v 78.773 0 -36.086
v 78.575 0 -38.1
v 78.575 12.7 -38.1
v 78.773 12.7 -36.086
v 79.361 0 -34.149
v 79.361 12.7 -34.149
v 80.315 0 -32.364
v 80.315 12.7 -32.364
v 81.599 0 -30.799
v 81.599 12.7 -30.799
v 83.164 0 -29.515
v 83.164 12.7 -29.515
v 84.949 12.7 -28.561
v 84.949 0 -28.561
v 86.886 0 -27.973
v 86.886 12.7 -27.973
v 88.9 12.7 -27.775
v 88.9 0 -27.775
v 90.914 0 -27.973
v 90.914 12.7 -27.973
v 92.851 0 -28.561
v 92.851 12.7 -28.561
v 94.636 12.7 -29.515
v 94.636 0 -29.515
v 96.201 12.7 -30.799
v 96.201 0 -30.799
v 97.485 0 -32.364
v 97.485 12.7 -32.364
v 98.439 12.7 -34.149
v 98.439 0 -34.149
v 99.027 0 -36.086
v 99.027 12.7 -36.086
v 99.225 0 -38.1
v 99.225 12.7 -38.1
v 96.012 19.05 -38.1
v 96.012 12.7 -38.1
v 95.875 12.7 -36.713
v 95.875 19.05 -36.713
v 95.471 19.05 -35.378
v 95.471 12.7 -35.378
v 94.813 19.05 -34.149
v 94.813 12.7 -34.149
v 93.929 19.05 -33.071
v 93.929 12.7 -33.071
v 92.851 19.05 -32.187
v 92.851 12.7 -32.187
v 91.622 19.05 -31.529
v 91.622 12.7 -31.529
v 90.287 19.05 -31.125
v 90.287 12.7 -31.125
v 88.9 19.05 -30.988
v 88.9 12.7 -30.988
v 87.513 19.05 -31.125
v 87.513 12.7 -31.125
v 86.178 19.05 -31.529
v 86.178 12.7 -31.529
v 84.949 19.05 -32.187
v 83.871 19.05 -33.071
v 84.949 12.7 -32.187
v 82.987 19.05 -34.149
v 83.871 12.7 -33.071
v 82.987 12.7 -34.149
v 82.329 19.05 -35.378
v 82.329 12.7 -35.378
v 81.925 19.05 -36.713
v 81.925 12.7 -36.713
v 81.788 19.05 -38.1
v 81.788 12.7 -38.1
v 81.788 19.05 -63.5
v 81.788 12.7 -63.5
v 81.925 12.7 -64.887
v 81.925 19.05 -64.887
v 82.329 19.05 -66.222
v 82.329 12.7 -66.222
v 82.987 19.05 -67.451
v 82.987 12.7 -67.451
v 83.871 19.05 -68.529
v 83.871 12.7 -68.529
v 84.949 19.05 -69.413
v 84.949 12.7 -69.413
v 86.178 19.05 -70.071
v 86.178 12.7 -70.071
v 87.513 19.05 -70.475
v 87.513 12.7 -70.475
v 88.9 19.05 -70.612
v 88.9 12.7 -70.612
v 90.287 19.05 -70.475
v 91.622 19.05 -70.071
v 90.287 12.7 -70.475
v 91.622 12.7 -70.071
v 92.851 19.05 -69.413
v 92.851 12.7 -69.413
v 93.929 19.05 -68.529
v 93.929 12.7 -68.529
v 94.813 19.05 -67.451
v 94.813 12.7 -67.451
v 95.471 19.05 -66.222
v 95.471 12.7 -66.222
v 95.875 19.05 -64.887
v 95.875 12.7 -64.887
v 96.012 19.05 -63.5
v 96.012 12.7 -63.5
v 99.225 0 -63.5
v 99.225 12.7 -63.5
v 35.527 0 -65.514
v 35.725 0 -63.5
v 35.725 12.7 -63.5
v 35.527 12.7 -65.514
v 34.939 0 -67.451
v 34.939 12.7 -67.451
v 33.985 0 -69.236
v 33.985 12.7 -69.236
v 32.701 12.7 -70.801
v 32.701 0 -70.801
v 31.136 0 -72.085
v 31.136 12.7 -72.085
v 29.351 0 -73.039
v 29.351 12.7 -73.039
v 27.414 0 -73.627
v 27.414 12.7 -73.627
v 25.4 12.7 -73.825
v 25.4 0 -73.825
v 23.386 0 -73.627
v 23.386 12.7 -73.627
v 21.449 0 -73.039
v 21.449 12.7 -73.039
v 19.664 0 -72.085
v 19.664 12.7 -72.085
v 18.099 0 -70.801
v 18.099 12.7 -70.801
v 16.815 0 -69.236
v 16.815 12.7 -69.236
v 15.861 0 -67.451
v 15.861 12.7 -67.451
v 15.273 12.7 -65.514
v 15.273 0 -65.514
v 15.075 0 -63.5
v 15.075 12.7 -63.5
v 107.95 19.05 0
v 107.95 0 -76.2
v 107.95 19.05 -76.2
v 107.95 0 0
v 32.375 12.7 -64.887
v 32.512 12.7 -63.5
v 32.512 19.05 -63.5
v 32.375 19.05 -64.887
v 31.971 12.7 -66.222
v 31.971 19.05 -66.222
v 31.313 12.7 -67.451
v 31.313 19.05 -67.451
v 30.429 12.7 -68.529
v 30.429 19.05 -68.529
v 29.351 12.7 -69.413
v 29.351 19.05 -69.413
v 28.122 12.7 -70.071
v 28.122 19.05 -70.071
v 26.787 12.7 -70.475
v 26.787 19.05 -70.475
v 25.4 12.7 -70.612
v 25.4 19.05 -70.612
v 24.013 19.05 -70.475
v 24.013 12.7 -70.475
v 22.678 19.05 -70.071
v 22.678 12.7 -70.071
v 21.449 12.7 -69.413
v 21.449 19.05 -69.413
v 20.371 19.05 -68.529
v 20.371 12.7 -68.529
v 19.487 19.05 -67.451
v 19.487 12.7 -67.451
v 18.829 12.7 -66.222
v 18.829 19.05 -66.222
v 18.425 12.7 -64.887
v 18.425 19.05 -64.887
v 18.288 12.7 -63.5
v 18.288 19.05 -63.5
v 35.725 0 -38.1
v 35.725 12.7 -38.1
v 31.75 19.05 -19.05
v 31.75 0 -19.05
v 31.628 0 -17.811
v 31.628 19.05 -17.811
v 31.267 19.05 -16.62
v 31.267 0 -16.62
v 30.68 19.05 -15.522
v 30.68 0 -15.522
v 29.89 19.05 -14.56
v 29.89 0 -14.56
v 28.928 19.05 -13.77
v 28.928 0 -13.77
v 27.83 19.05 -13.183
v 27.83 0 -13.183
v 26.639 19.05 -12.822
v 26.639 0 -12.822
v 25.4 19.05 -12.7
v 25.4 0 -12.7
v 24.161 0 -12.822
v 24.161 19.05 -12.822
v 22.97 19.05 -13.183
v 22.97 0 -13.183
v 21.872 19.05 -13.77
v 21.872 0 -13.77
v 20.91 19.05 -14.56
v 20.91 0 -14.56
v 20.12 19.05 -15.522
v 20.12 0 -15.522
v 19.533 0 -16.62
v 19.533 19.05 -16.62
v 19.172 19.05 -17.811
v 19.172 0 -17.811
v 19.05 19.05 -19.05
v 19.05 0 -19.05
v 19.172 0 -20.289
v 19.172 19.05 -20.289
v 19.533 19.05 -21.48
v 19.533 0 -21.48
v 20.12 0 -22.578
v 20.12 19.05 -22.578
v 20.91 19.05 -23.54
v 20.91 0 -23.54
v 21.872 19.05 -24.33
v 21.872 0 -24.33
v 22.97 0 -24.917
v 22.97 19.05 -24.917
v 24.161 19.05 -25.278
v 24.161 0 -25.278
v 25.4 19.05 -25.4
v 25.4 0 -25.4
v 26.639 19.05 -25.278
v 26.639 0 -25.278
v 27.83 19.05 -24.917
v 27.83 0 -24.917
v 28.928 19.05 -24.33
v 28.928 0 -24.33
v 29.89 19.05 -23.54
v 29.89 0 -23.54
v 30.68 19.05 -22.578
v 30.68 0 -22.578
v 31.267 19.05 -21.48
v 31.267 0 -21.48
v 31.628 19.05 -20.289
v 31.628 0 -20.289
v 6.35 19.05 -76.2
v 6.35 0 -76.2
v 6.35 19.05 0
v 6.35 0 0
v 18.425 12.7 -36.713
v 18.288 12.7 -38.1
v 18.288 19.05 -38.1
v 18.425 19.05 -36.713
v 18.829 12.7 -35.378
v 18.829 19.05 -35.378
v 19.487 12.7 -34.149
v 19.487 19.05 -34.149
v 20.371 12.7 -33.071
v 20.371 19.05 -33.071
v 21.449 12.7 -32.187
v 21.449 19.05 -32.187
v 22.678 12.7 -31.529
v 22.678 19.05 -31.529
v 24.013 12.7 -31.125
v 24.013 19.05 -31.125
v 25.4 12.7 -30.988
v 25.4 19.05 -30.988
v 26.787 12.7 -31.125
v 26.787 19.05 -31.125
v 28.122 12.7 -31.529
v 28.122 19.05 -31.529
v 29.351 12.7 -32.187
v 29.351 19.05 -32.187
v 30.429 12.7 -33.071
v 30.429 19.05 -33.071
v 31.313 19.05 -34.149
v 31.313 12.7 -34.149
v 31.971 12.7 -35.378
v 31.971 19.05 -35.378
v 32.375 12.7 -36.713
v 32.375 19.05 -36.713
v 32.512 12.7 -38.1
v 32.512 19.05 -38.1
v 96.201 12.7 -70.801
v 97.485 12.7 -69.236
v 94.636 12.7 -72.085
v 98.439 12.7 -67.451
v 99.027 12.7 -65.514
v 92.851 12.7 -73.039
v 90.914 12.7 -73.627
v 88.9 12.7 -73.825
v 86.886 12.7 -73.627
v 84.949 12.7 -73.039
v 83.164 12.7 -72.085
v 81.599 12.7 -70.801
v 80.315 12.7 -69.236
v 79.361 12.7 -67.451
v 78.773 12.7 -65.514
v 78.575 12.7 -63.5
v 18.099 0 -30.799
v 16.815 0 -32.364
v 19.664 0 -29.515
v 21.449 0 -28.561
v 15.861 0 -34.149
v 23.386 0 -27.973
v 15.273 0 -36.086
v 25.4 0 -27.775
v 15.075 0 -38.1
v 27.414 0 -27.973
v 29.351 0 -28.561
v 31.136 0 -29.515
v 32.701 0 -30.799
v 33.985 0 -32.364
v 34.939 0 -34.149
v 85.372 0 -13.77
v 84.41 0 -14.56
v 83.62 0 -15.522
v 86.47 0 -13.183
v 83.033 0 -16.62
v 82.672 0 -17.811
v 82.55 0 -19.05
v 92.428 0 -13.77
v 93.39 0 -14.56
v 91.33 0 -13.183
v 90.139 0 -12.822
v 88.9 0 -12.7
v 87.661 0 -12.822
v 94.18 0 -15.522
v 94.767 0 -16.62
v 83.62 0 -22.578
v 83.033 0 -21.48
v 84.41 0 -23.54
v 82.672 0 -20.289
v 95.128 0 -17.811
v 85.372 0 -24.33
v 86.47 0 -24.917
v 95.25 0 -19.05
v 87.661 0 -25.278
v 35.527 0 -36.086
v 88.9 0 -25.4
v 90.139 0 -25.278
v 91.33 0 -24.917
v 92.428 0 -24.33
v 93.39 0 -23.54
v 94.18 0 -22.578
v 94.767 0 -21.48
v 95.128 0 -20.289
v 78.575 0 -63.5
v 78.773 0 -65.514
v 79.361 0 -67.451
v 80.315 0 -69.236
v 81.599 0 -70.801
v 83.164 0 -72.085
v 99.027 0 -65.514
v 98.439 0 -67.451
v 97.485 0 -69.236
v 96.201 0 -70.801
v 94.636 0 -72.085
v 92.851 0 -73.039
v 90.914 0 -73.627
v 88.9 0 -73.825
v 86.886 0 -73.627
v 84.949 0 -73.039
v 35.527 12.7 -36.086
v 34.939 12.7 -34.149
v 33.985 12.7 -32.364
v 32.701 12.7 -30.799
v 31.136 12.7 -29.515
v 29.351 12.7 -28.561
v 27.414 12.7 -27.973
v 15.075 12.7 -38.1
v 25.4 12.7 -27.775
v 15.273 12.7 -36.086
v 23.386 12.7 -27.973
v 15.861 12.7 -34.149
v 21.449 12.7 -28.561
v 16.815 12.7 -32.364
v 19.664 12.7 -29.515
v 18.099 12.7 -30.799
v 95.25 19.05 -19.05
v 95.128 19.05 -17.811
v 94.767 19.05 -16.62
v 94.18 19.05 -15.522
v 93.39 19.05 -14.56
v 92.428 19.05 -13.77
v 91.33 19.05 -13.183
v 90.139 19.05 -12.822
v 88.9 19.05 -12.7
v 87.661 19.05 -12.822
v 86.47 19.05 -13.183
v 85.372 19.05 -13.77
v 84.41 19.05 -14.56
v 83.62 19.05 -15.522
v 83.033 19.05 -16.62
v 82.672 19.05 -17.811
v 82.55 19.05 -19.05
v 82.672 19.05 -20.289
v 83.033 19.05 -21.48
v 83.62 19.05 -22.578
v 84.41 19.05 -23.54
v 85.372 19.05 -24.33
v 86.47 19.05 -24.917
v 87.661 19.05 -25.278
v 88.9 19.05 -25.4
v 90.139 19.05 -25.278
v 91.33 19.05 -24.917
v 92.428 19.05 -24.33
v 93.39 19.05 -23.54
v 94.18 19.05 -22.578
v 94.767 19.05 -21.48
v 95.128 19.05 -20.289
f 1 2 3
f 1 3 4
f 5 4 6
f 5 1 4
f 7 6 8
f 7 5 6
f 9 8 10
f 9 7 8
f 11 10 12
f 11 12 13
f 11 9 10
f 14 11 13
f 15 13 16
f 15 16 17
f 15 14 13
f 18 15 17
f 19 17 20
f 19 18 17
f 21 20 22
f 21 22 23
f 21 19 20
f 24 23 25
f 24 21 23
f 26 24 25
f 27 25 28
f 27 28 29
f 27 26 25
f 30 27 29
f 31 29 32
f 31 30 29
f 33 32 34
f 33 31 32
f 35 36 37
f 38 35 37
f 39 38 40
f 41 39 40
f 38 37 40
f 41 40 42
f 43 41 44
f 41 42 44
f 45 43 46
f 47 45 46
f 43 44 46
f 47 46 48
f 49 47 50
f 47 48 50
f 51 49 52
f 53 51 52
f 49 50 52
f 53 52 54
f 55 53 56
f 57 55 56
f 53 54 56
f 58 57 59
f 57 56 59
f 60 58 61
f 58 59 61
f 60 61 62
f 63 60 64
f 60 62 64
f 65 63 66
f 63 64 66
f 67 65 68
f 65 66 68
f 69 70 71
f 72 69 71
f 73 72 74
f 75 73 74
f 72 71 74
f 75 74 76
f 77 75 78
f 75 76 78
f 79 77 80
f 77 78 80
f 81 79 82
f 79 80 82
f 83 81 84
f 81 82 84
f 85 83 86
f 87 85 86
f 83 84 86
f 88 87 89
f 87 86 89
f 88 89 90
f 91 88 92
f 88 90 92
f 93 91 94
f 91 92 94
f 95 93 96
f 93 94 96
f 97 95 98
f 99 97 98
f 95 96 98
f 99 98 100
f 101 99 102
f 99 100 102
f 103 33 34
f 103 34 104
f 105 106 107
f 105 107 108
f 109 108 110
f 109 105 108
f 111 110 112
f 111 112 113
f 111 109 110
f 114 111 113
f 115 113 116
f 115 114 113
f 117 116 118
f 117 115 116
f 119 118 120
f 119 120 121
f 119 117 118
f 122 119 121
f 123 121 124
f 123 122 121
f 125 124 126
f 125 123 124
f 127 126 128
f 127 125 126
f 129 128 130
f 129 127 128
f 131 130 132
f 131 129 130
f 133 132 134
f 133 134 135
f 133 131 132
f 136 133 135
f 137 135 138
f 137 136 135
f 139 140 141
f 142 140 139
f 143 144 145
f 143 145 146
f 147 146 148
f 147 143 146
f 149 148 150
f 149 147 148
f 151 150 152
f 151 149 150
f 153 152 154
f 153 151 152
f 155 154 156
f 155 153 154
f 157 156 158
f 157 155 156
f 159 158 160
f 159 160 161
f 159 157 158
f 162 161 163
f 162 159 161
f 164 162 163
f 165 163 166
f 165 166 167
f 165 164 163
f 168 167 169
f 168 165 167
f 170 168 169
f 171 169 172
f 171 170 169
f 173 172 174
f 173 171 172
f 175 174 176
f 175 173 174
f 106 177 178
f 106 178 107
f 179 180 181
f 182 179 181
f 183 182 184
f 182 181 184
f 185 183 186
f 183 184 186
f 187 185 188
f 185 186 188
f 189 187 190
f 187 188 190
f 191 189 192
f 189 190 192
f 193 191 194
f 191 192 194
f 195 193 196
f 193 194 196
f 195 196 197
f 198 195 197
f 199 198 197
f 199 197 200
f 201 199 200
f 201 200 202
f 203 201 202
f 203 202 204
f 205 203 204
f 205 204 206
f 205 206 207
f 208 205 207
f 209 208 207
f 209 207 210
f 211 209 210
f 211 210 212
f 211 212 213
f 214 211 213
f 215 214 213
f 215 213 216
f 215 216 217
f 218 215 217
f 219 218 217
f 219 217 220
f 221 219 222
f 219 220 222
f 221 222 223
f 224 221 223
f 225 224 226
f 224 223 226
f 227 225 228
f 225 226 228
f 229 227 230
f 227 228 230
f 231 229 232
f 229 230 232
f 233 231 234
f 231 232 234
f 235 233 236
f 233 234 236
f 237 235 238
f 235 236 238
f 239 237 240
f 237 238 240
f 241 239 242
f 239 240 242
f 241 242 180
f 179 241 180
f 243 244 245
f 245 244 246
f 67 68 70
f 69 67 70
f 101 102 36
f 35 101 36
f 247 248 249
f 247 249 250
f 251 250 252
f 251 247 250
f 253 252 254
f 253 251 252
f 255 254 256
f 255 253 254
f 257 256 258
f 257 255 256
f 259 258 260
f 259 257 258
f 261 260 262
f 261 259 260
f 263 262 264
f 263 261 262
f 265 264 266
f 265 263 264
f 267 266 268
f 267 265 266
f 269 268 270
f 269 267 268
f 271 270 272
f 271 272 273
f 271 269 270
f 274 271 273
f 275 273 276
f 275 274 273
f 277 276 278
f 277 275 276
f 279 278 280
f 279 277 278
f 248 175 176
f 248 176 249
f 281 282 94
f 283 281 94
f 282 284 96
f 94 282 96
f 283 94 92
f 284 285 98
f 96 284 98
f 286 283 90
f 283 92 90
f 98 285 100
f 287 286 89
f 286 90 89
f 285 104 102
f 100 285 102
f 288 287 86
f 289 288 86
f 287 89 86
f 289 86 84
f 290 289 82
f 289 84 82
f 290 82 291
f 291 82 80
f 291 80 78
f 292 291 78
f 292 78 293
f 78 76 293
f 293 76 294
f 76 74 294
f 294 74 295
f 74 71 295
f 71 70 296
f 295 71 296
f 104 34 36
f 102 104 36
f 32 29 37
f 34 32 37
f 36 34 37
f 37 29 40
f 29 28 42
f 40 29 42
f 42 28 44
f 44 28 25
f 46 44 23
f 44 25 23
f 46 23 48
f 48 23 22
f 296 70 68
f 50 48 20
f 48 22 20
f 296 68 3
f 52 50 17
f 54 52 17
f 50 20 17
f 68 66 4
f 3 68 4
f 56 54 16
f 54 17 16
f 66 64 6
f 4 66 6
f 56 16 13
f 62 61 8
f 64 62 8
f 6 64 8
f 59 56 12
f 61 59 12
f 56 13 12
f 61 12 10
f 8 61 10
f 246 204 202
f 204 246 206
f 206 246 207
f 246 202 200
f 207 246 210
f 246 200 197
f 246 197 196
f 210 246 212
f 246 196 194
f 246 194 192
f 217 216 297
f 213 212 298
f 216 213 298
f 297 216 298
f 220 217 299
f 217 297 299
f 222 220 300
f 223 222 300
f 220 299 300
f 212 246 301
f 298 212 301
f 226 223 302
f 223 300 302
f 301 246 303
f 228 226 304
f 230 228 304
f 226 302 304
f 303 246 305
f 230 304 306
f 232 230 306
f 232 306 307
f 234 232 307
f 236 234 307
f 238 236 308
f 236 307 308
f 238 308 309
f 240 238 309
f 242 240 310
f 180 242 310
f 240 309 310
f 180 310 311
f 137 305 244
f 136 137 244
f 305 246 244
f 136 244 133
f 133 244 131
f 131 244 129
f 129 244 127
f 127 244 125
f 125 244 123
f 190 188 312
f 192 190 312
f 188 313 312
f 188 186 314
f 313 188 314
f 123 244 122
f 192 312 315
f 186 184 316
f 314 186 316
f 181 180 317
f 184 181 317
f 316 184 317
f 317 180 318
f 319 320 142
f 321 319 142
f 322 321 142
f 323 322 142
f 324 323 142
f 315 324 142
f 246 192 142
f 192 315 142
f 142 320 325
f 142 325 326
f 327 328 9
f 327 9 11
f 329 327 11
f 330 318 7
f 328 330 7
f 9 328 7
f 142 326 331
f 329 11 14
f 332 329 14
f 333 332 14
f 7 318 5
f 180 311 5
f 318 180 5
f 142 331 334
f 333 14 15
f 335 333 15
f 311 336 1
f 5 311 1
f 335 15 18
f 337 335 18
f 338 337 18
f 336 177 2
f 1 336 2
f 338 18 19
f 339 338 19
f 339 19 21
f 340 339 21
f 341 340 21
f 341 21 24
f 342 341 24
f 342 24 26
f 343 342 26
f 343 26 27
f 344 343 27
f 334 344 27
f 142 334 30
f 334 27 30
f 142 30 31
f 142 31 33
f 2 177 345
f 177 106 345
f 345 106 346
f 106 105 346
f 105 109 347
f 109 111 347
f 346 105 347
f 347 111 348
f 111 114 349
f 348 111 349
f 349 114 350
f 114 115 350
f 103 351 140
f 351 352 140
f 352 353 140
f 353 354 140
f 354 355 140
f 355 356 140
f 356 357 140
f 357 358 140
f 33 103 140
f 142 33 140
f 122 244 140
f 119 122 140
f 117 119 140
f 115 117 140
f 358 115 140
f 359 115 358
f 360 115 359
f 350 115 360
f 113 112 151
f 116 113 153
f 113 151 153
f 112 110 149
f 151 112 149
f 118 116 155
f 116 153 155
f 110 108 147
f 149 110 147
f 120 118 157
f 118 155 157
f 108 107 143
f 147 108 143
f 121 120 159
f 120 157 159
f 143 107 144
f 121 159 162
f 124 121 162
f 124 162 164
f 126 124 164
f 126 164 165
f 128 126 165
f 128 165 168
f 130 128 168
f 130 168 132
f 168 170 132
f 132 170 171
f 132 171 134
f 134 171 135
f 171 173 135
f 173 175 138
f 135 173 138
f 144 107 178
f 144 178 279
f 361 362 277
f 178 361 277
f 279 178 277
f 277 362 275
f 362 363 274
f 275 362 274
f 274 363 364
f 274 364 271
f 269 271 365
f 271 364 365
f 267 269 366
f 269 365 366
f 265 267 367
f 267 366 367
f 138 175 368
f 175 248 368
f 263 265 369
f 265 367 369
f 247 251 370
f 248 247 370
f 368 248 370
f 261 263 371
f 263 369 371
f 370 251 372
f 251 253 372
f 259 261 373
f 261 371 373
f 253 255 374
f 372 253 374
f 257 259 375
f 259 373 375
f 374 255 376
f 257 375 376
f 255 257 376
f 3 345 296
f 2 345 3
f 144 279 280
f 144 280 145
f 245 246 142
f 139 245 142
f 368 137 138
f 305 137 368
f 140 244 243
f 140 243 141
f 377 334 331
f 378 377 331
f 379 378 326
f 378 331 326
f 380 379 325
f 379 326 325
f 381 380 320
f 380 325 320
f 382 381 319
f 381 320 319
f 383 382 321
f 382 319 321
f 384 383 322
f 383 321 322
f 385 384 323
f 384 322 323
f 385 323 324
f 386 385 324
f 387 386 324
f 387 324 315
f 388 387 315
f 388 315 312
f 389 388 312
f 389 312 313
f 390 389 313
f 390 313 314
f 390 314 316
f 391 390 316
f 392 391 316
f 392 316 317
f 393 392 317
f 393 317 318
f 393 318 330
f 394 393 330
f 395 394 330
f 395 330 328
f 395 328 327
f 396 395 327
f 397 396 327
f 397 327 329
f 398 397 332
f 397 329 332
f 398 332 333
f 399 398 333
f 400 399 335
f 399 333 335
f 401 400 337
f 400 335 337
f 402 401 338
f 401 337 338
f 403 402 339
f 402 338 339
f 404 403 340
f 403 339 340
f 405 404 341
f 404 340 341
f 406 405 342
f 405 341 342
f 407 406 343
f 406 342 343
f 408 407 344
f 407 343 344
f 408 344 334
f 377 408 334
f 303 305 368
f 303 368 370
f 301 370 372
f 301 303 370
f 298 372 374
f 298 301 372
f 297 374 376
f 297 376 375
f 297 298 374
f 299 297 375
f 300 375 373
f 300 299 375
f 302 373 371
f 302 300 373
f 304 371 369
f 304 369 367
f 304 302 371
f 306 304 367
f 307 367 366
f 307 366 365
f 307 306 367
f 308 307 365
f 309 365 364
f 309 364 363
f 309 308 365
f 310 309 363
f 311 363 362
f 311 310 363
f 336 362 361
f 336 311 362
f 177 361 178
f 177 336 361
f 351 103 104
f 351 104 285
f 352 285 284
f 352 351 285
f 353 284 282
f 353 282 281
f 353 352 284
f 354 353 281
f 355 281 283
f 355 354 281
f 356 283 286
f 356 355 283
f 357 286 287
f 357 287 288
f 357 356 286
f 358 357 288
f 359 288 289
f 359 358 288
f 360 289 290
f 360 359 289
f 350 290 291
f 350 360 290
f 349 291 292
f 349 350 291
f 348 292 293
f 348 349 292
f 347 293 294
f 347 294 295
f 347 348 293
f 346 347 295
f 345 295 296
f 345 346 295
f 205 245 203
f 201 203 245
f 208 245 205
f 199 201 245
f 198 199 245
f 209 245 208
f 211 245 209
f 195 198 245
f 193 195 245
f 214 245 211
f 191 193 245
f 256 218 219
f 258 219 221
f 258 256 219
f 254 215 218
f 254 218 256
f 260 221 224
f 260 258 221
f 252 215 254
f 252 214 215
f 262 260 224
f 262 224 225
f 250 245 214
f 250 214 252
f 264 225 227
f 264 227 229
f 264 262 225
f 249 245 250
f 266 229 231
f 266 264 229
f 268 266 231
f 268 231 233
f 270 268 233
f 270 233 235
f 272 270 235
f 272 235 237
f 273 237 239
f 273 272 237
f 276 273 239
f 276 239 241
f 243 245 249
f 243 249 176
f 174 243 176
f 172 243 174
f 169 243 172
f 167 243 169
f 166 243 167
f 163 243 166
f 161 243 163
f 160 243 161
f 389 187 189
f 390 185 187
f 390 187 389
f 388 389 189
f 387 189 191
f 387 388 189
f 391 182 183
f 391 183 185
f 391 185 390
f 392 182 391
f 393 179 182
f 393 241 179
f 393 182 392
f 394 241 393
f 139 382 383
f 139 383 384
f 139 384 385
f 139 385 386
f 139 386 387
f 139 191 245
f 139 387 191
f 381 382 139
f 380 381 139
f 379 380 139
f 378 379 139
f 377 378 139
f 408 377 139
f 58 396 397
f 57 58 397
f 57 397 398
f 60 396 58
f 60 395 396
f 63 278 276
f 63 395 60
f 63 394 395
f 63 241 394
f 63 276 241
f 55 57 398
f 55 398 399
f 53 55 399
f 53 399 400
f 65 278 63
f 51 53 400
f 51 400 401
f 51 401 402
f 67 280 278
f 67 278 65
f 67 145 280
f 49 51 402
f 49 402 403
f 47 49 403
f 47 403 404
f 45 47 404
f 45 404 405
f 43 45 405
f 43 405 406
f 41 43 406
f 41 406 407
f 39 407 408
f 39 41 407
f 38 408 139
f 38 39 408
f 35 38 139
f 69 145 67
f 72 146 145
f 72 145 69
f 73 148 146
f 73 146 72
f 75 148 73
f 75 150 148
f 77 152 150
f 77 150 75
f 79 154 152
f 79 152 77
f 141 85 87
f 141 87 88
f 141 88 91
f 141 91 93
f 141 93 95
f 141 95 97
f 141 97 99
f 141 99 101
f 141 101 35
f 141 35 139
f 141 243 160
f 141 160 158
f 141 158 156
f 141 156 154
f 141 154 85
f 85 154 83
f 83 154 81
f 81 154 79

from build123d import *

# Parameters (mm, degrees)
SKETCH1_W               = 114.3
SKETCH1_H               = 76.2
BASE_EXTRUDE_DEPTH      = 19.05
F_1_2_20_TAPPED_HOLE1_D = 12.7
CUT_EXTRUDE1_DEPTH      = 12.7
CUT_EXTRUDE2_DEPTH      = 12.7
SKETCH7_W               = 6.35
SKETCH7_H               = 76.2
CUT_EXTRUDE3_DEPTH      = 1
CUT_EXTRUDE3_DEPTH_BACK = 20.05
SKETCH8_W               = 6.35
SKETCH8_H               = 76.2
CUT_EXTRUDE4_DEPTH      = 1
CUT_EXTRUDE4_DEPTH_BACK = 20.05


with BuildPart() as part:
    # Sketch1 → Base-Extrude (new body)
    with BuildSketch(Plane(origin=(0, 0, 0), x_dir=(1, 0, 0), z_dir=(0, 1, 0))):
        with Locations((57.15, 38.1)):
            Rectangle(SKETCH1_W, SKETCH1_H)
        with BuildLine():
            Line((96.012, 63.5), (96.012, 38.1))
            ThreePointArc((96.012, 38.1), (88.9, 30.988), (81.788, 38.1))
            Line((81.788, 38.1), (81.788, 63.5))
            ThreePointArc((81.788, 63.5), (88.9, 70.612), (96.012, 63.5))
        make_face(mode=Mode.SUBTRACT)
        with BuildLine():
            Line((18.288, 63.5), (18.288, 38.1))
            ThreePointArc((18.288, 38.1), (25.4, 30.988), (32.512, 38.1))
            Line((32.512, 38.1), (32.512, 63.5))
            ThreePointArc((32.512, 63.5), (25.4, 70.612), (18.288, 63.5))
        make_face(mode=Mode.SUBTRACT)
    extrude(amount=BASE_EXTRUDE_DEPTH)

    # 1/2-20 Tapped Hole1 (through all)
    with Locations(Plane(origin=(0, 19.05, 0), x_dir=(-1, 0, 0), z_dir=(0, 1, 0))):
        with Locations((-25.4, -19.05), (-88.9, -19.05)):
            Hole(F_1_2_20_TAPPED_HOLE1_D / 2)

    # Sketch4 → Cut-Extrude1 (cut)
    with BuildSketch(Plane.XZ):
        with BuildLine():
            Line((15.0749, -63.5), (15.0749, -38.1))
            ThreePointArc((15.0749, -38.1), (25.4, -27.7749), (35.7251, -38.1))
            Line((35.7251, -38.1), (35.7251, -63.5))
            ThreePointArc((35.7251, -63.5), (25.4, -73.8251), (15.0749, -63.5))
        make_face()
    extrude(amount=-CUT_EXTRUDE1_DEPTH, mode=Mode.SUBTRACT)

    # Sketch5 → Cut-Extrude2 (cut)
    with BuildSketch(Plane.XZ):
        with BuildLine():
            Line((99.2251, -38.1), (99.2251, -63.5))
            ThreePointArc((99.2251, -63.5), (88.9, -73.8251), (78.5749, -63.5))
            Line((78.5749, -63.5), (78.5749, -38.1))
            ThreePointArc((78.5749, -38.1), (88.9, -27.7749), (99.2251, -38.1))
        make_face()
    extrude(amount=-CUT_EXTRUDE2_DEPTH, mode=Mode.SUBTRACT)

    # Sketch7 → Cut-Extrude3 (cut, two sides)
    with BuildSketch(Plane.XZ) as cut_extrude3_sk:
        with Locations((111.125, -38.1)):
            Rectangle(SKETCH7_W, SKETCH7_H)
    extrude(amount=CUT_EXTRUDE3_DEPTH, mode=Mode.SUBTRACT)
    extrude(cut_extrude3_sk.sketch, amount=-CUT_EXTRUDE3_DEPTH_BACK, mode=Mode.SUBTRACT)

    # Sketch8 → Cut-Extrude4 (cut, two sides)
    with BuildSketch(Plane.XZ) as cut_extrude4_sk:
        with Locations((3.175, -38.1)):
            Rectangle(SKETCH8_W, SKETCH8_H)
    extrude(amount=CUT_EXTRUDE4_DEPTH, mode=Mode.SUBTRACT)
    extrude(cut_extrude4_sk.sketch, amount=-CUT_EXTRUDE4_DEPTH_BACK, mode=Mode.SUBTRACT)


solid = part.part
